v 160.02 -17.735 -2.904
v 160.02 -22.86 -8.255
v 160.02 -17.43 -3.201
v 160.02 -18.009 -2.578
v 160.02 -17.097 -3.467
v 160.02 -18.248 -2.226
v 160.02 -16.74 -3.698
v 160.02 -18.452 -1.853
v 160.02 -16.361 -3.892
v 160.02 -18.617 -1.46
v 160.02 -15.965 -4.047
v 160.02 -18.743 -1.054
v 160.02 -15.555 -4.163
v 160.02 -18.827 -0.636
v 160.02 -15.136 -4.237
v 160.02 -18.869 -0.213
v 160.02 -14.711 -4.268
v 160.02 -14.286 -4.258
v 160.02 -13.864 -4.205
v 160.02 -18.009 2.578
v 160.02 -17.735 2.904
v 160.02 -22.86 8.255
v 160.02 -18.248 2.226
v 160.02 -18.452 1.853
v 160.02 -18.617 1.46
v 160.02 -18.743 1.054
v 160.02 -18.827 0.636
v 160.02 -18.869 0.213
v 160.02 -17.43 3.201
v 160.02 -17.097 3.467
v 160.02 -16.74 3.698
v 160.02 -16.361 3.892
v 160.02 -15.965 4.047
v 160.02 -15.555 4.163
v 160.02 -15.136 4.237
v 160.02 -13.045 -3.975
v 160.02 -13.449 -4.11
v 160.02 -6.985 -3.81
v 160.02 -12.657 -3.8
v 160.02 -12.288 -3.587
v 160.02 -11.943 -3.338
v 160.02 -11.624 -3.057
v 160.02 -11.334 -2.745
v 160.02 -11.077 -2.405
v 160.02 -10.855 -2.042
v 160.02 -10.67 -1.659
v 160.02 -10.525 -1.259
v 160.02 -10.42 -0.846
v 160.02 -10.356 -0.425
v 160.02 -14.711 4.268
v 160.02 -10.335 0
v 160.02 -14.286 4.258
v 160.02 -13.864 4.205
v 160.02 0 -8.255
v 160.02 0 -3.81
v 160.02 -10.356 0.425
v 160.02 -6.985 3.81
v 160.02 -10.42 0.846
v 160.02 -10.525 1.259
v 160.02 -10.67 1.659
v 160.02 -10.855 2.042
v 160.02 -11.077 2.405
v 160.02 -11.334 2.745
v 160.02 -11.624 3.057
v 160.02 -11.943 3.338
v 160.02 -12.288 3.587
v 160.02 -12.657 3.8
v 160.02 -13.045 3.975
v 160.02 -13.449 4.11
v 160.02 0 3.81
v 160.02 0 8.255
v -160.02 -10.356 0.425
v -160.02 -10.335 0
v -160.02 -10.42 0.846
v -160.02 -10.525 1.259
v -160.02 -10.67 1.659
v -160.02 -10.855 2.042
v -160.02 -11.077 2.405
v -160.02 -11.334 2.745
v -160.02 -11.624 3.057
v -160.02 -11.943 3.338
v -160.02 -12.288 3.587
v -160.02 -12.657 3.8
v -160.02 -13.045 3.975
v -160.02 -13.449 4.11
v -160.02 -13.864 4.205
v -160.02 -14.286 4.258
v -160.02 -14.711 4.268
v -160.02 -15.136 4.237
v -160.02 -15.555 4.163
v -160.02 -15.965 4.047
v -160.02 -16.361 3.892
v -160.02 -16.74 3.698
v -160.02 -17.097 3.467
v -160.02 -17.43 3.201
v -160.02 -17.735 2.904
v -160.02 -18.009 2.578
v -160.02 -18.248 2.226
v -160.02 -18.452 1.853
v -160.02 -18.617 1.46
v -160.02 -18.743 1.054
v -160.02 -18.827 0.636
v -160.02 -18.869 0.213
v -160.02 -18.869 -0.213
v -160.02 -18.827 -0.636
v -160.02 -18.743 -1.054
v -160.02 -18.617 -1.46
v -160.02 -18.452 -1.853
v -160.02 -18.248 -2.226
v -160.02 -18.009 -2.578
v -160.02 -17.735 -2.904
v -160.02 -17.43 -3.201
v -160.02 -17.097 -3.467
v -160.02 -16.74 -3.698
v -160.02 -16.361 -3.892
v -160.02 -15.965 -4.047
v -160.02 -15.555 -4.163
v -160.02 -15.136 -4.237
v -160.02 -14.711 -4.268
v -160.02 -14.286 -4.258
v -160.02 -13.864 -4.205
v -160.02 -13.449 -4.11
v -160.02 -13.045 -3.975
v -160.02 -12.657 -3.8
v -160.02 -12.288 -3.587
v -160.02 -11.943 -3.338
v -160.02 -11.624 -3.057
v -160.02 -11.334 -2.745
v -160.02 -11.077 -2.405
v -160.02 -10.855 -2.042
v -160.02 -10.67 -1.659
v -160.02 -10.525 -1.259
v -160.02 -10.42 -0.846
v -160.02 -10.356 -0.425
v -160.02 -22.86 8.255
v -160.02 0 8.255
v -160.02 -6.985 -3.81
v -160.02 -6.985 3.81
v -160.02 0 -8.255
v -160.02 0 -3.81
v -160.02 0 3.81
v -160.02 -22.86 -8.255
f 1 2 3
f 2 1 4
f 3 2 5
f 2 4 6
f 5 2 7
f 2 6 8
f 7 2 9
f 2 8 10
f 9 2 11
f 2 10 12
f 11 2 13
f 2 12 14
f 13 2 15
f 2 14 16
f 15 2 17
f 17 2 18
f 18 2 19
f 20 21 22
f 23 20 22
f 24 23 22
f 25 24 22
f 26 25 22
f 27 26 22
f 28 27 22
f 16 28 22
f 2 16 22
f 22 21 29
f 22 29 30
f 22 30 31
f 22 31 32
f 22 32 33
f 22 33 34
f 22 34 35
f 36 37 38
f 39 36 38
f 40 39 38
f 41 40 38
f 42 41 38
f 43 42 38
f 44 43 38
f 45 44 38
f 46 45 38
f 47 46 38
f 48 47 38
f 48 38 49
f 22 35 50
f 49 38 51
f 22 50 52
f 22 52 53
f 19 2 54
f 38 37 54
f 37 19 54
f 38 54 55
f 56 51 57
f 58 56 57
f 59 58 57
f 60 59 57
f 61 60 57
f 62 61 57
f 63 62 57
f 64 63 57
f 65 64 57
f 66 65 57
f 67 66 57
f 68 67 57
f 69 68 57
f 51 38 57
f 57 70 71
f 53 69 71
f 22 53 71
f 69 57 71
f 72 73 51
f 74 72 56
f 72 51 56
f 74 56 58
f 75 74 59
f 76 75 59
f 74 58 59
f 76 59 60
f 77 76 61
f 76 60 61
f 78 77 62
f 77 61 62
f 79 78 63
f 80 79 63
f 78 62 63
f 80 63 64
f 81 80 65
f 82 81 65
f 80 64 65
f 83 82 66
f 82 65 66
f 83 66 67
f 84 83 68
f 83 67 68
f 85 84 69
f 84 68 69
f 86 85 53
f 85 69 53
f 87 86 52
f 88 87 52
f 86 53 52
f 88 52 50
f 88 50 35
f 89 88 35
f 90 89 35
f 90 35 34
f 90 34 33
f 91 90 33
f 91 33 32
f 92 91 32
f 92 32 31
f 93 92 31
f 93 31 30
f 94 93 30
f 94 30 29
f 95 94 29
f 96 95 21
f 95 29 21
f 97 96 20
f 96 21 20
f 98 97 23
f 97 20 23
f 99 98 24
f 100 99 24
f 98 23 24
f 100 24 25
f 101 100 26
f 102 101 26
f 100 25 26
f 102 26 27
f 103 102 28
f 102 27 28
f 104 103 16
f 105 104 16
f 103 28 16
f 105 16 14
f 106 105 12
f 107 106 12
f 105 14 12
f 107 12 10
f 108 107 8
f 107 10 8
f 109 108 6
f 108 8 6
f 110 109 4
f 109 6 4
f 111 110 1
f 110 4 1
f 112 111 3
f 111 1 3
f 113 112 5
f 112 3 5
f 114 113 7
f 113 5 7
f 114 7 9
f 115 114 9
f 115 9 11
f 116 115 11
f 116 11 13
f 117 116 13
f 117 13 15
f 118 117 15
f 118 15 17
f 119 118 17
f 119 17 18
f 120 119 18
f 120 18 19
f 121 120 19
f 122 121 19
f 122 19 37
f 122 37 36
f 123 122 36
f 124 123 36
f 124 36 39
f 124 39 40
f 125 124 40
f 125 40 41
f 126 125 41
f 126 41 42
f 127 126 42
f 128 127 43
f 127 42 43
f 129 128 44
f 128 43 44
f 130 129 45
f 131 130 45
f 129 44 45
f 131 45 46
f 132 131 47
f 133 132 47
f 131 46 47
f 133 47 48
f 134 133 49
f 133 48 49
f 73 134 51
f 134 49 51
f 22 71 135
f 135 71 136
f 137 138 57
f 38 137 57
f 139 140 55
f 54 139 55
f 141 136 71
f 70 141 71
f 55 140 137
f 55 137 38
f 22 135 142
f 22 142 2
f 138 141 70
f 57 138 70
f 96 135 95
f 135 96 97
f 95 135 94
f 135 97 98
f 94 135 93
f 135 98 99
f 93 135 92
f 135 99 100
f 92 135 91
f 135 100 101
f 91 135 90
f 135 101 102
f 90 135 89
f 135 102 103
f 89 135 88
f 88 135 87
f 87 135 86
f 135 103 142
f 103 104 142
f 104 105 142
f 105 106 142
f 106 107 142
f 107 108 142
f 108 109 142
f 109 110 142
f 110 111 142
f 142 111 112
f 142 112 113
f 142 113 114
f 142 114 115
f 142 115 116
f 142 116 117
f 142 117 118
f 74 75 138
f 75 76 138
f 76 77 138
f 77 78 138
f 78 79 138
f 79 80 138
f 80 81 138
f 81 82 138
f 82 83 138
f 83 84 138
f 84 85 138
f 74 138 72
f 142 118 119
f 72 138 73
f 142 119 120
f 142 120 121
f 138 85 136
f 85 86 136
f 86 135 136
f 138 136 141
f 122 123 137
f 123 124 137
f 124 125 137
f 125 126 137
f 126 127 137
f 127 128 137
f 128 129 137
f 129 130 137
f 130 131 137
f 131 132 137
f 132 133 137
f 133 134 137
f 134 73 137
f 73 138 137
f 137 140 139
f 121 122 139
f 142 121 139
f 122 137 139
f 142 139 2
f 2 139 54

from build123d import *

# Parameters (mm, degrees)
F1_DEPTH = 22.86
F2_W     = 320.04
F2_H     = 7.62
F3_DEPTH = 6.985
F4_R     = 4.269801
F5_DEPTH = 160.02


with BuildPart() as f1:
    # F0 (on Front) → F1 (new body)
    with BuildSketch(Plane.XZ):
        Polygon((160.02, 8.255), (-160.02, 8.255), (-160.02, 3.81), (-160.02, -3.81), (-160.02, -8.255), (160.02, -8.255), (160.02, -3.81), (160.02, 3.81), align=None)
    extrude(amount=F1_DEPTH)

    # F2 (on Front) → F3 (cut)
    with BuildSketch(Plane.XZ):
        Rectangle(F2_W, F2_H)
    extrude(amount=F3_DEPTH, mode=Mode.SUBTRACT)

    # F4 (on Right) → F5 (cut, symmetric)
    with BuildSketch(Plane.YZ):
        with Locations((-14.605, 0)):
            Circle(F4_R)
    extrude(amount=F5_DEPTH, both=True, mode=Mode.SUBTRACT)


solid = f1.part
